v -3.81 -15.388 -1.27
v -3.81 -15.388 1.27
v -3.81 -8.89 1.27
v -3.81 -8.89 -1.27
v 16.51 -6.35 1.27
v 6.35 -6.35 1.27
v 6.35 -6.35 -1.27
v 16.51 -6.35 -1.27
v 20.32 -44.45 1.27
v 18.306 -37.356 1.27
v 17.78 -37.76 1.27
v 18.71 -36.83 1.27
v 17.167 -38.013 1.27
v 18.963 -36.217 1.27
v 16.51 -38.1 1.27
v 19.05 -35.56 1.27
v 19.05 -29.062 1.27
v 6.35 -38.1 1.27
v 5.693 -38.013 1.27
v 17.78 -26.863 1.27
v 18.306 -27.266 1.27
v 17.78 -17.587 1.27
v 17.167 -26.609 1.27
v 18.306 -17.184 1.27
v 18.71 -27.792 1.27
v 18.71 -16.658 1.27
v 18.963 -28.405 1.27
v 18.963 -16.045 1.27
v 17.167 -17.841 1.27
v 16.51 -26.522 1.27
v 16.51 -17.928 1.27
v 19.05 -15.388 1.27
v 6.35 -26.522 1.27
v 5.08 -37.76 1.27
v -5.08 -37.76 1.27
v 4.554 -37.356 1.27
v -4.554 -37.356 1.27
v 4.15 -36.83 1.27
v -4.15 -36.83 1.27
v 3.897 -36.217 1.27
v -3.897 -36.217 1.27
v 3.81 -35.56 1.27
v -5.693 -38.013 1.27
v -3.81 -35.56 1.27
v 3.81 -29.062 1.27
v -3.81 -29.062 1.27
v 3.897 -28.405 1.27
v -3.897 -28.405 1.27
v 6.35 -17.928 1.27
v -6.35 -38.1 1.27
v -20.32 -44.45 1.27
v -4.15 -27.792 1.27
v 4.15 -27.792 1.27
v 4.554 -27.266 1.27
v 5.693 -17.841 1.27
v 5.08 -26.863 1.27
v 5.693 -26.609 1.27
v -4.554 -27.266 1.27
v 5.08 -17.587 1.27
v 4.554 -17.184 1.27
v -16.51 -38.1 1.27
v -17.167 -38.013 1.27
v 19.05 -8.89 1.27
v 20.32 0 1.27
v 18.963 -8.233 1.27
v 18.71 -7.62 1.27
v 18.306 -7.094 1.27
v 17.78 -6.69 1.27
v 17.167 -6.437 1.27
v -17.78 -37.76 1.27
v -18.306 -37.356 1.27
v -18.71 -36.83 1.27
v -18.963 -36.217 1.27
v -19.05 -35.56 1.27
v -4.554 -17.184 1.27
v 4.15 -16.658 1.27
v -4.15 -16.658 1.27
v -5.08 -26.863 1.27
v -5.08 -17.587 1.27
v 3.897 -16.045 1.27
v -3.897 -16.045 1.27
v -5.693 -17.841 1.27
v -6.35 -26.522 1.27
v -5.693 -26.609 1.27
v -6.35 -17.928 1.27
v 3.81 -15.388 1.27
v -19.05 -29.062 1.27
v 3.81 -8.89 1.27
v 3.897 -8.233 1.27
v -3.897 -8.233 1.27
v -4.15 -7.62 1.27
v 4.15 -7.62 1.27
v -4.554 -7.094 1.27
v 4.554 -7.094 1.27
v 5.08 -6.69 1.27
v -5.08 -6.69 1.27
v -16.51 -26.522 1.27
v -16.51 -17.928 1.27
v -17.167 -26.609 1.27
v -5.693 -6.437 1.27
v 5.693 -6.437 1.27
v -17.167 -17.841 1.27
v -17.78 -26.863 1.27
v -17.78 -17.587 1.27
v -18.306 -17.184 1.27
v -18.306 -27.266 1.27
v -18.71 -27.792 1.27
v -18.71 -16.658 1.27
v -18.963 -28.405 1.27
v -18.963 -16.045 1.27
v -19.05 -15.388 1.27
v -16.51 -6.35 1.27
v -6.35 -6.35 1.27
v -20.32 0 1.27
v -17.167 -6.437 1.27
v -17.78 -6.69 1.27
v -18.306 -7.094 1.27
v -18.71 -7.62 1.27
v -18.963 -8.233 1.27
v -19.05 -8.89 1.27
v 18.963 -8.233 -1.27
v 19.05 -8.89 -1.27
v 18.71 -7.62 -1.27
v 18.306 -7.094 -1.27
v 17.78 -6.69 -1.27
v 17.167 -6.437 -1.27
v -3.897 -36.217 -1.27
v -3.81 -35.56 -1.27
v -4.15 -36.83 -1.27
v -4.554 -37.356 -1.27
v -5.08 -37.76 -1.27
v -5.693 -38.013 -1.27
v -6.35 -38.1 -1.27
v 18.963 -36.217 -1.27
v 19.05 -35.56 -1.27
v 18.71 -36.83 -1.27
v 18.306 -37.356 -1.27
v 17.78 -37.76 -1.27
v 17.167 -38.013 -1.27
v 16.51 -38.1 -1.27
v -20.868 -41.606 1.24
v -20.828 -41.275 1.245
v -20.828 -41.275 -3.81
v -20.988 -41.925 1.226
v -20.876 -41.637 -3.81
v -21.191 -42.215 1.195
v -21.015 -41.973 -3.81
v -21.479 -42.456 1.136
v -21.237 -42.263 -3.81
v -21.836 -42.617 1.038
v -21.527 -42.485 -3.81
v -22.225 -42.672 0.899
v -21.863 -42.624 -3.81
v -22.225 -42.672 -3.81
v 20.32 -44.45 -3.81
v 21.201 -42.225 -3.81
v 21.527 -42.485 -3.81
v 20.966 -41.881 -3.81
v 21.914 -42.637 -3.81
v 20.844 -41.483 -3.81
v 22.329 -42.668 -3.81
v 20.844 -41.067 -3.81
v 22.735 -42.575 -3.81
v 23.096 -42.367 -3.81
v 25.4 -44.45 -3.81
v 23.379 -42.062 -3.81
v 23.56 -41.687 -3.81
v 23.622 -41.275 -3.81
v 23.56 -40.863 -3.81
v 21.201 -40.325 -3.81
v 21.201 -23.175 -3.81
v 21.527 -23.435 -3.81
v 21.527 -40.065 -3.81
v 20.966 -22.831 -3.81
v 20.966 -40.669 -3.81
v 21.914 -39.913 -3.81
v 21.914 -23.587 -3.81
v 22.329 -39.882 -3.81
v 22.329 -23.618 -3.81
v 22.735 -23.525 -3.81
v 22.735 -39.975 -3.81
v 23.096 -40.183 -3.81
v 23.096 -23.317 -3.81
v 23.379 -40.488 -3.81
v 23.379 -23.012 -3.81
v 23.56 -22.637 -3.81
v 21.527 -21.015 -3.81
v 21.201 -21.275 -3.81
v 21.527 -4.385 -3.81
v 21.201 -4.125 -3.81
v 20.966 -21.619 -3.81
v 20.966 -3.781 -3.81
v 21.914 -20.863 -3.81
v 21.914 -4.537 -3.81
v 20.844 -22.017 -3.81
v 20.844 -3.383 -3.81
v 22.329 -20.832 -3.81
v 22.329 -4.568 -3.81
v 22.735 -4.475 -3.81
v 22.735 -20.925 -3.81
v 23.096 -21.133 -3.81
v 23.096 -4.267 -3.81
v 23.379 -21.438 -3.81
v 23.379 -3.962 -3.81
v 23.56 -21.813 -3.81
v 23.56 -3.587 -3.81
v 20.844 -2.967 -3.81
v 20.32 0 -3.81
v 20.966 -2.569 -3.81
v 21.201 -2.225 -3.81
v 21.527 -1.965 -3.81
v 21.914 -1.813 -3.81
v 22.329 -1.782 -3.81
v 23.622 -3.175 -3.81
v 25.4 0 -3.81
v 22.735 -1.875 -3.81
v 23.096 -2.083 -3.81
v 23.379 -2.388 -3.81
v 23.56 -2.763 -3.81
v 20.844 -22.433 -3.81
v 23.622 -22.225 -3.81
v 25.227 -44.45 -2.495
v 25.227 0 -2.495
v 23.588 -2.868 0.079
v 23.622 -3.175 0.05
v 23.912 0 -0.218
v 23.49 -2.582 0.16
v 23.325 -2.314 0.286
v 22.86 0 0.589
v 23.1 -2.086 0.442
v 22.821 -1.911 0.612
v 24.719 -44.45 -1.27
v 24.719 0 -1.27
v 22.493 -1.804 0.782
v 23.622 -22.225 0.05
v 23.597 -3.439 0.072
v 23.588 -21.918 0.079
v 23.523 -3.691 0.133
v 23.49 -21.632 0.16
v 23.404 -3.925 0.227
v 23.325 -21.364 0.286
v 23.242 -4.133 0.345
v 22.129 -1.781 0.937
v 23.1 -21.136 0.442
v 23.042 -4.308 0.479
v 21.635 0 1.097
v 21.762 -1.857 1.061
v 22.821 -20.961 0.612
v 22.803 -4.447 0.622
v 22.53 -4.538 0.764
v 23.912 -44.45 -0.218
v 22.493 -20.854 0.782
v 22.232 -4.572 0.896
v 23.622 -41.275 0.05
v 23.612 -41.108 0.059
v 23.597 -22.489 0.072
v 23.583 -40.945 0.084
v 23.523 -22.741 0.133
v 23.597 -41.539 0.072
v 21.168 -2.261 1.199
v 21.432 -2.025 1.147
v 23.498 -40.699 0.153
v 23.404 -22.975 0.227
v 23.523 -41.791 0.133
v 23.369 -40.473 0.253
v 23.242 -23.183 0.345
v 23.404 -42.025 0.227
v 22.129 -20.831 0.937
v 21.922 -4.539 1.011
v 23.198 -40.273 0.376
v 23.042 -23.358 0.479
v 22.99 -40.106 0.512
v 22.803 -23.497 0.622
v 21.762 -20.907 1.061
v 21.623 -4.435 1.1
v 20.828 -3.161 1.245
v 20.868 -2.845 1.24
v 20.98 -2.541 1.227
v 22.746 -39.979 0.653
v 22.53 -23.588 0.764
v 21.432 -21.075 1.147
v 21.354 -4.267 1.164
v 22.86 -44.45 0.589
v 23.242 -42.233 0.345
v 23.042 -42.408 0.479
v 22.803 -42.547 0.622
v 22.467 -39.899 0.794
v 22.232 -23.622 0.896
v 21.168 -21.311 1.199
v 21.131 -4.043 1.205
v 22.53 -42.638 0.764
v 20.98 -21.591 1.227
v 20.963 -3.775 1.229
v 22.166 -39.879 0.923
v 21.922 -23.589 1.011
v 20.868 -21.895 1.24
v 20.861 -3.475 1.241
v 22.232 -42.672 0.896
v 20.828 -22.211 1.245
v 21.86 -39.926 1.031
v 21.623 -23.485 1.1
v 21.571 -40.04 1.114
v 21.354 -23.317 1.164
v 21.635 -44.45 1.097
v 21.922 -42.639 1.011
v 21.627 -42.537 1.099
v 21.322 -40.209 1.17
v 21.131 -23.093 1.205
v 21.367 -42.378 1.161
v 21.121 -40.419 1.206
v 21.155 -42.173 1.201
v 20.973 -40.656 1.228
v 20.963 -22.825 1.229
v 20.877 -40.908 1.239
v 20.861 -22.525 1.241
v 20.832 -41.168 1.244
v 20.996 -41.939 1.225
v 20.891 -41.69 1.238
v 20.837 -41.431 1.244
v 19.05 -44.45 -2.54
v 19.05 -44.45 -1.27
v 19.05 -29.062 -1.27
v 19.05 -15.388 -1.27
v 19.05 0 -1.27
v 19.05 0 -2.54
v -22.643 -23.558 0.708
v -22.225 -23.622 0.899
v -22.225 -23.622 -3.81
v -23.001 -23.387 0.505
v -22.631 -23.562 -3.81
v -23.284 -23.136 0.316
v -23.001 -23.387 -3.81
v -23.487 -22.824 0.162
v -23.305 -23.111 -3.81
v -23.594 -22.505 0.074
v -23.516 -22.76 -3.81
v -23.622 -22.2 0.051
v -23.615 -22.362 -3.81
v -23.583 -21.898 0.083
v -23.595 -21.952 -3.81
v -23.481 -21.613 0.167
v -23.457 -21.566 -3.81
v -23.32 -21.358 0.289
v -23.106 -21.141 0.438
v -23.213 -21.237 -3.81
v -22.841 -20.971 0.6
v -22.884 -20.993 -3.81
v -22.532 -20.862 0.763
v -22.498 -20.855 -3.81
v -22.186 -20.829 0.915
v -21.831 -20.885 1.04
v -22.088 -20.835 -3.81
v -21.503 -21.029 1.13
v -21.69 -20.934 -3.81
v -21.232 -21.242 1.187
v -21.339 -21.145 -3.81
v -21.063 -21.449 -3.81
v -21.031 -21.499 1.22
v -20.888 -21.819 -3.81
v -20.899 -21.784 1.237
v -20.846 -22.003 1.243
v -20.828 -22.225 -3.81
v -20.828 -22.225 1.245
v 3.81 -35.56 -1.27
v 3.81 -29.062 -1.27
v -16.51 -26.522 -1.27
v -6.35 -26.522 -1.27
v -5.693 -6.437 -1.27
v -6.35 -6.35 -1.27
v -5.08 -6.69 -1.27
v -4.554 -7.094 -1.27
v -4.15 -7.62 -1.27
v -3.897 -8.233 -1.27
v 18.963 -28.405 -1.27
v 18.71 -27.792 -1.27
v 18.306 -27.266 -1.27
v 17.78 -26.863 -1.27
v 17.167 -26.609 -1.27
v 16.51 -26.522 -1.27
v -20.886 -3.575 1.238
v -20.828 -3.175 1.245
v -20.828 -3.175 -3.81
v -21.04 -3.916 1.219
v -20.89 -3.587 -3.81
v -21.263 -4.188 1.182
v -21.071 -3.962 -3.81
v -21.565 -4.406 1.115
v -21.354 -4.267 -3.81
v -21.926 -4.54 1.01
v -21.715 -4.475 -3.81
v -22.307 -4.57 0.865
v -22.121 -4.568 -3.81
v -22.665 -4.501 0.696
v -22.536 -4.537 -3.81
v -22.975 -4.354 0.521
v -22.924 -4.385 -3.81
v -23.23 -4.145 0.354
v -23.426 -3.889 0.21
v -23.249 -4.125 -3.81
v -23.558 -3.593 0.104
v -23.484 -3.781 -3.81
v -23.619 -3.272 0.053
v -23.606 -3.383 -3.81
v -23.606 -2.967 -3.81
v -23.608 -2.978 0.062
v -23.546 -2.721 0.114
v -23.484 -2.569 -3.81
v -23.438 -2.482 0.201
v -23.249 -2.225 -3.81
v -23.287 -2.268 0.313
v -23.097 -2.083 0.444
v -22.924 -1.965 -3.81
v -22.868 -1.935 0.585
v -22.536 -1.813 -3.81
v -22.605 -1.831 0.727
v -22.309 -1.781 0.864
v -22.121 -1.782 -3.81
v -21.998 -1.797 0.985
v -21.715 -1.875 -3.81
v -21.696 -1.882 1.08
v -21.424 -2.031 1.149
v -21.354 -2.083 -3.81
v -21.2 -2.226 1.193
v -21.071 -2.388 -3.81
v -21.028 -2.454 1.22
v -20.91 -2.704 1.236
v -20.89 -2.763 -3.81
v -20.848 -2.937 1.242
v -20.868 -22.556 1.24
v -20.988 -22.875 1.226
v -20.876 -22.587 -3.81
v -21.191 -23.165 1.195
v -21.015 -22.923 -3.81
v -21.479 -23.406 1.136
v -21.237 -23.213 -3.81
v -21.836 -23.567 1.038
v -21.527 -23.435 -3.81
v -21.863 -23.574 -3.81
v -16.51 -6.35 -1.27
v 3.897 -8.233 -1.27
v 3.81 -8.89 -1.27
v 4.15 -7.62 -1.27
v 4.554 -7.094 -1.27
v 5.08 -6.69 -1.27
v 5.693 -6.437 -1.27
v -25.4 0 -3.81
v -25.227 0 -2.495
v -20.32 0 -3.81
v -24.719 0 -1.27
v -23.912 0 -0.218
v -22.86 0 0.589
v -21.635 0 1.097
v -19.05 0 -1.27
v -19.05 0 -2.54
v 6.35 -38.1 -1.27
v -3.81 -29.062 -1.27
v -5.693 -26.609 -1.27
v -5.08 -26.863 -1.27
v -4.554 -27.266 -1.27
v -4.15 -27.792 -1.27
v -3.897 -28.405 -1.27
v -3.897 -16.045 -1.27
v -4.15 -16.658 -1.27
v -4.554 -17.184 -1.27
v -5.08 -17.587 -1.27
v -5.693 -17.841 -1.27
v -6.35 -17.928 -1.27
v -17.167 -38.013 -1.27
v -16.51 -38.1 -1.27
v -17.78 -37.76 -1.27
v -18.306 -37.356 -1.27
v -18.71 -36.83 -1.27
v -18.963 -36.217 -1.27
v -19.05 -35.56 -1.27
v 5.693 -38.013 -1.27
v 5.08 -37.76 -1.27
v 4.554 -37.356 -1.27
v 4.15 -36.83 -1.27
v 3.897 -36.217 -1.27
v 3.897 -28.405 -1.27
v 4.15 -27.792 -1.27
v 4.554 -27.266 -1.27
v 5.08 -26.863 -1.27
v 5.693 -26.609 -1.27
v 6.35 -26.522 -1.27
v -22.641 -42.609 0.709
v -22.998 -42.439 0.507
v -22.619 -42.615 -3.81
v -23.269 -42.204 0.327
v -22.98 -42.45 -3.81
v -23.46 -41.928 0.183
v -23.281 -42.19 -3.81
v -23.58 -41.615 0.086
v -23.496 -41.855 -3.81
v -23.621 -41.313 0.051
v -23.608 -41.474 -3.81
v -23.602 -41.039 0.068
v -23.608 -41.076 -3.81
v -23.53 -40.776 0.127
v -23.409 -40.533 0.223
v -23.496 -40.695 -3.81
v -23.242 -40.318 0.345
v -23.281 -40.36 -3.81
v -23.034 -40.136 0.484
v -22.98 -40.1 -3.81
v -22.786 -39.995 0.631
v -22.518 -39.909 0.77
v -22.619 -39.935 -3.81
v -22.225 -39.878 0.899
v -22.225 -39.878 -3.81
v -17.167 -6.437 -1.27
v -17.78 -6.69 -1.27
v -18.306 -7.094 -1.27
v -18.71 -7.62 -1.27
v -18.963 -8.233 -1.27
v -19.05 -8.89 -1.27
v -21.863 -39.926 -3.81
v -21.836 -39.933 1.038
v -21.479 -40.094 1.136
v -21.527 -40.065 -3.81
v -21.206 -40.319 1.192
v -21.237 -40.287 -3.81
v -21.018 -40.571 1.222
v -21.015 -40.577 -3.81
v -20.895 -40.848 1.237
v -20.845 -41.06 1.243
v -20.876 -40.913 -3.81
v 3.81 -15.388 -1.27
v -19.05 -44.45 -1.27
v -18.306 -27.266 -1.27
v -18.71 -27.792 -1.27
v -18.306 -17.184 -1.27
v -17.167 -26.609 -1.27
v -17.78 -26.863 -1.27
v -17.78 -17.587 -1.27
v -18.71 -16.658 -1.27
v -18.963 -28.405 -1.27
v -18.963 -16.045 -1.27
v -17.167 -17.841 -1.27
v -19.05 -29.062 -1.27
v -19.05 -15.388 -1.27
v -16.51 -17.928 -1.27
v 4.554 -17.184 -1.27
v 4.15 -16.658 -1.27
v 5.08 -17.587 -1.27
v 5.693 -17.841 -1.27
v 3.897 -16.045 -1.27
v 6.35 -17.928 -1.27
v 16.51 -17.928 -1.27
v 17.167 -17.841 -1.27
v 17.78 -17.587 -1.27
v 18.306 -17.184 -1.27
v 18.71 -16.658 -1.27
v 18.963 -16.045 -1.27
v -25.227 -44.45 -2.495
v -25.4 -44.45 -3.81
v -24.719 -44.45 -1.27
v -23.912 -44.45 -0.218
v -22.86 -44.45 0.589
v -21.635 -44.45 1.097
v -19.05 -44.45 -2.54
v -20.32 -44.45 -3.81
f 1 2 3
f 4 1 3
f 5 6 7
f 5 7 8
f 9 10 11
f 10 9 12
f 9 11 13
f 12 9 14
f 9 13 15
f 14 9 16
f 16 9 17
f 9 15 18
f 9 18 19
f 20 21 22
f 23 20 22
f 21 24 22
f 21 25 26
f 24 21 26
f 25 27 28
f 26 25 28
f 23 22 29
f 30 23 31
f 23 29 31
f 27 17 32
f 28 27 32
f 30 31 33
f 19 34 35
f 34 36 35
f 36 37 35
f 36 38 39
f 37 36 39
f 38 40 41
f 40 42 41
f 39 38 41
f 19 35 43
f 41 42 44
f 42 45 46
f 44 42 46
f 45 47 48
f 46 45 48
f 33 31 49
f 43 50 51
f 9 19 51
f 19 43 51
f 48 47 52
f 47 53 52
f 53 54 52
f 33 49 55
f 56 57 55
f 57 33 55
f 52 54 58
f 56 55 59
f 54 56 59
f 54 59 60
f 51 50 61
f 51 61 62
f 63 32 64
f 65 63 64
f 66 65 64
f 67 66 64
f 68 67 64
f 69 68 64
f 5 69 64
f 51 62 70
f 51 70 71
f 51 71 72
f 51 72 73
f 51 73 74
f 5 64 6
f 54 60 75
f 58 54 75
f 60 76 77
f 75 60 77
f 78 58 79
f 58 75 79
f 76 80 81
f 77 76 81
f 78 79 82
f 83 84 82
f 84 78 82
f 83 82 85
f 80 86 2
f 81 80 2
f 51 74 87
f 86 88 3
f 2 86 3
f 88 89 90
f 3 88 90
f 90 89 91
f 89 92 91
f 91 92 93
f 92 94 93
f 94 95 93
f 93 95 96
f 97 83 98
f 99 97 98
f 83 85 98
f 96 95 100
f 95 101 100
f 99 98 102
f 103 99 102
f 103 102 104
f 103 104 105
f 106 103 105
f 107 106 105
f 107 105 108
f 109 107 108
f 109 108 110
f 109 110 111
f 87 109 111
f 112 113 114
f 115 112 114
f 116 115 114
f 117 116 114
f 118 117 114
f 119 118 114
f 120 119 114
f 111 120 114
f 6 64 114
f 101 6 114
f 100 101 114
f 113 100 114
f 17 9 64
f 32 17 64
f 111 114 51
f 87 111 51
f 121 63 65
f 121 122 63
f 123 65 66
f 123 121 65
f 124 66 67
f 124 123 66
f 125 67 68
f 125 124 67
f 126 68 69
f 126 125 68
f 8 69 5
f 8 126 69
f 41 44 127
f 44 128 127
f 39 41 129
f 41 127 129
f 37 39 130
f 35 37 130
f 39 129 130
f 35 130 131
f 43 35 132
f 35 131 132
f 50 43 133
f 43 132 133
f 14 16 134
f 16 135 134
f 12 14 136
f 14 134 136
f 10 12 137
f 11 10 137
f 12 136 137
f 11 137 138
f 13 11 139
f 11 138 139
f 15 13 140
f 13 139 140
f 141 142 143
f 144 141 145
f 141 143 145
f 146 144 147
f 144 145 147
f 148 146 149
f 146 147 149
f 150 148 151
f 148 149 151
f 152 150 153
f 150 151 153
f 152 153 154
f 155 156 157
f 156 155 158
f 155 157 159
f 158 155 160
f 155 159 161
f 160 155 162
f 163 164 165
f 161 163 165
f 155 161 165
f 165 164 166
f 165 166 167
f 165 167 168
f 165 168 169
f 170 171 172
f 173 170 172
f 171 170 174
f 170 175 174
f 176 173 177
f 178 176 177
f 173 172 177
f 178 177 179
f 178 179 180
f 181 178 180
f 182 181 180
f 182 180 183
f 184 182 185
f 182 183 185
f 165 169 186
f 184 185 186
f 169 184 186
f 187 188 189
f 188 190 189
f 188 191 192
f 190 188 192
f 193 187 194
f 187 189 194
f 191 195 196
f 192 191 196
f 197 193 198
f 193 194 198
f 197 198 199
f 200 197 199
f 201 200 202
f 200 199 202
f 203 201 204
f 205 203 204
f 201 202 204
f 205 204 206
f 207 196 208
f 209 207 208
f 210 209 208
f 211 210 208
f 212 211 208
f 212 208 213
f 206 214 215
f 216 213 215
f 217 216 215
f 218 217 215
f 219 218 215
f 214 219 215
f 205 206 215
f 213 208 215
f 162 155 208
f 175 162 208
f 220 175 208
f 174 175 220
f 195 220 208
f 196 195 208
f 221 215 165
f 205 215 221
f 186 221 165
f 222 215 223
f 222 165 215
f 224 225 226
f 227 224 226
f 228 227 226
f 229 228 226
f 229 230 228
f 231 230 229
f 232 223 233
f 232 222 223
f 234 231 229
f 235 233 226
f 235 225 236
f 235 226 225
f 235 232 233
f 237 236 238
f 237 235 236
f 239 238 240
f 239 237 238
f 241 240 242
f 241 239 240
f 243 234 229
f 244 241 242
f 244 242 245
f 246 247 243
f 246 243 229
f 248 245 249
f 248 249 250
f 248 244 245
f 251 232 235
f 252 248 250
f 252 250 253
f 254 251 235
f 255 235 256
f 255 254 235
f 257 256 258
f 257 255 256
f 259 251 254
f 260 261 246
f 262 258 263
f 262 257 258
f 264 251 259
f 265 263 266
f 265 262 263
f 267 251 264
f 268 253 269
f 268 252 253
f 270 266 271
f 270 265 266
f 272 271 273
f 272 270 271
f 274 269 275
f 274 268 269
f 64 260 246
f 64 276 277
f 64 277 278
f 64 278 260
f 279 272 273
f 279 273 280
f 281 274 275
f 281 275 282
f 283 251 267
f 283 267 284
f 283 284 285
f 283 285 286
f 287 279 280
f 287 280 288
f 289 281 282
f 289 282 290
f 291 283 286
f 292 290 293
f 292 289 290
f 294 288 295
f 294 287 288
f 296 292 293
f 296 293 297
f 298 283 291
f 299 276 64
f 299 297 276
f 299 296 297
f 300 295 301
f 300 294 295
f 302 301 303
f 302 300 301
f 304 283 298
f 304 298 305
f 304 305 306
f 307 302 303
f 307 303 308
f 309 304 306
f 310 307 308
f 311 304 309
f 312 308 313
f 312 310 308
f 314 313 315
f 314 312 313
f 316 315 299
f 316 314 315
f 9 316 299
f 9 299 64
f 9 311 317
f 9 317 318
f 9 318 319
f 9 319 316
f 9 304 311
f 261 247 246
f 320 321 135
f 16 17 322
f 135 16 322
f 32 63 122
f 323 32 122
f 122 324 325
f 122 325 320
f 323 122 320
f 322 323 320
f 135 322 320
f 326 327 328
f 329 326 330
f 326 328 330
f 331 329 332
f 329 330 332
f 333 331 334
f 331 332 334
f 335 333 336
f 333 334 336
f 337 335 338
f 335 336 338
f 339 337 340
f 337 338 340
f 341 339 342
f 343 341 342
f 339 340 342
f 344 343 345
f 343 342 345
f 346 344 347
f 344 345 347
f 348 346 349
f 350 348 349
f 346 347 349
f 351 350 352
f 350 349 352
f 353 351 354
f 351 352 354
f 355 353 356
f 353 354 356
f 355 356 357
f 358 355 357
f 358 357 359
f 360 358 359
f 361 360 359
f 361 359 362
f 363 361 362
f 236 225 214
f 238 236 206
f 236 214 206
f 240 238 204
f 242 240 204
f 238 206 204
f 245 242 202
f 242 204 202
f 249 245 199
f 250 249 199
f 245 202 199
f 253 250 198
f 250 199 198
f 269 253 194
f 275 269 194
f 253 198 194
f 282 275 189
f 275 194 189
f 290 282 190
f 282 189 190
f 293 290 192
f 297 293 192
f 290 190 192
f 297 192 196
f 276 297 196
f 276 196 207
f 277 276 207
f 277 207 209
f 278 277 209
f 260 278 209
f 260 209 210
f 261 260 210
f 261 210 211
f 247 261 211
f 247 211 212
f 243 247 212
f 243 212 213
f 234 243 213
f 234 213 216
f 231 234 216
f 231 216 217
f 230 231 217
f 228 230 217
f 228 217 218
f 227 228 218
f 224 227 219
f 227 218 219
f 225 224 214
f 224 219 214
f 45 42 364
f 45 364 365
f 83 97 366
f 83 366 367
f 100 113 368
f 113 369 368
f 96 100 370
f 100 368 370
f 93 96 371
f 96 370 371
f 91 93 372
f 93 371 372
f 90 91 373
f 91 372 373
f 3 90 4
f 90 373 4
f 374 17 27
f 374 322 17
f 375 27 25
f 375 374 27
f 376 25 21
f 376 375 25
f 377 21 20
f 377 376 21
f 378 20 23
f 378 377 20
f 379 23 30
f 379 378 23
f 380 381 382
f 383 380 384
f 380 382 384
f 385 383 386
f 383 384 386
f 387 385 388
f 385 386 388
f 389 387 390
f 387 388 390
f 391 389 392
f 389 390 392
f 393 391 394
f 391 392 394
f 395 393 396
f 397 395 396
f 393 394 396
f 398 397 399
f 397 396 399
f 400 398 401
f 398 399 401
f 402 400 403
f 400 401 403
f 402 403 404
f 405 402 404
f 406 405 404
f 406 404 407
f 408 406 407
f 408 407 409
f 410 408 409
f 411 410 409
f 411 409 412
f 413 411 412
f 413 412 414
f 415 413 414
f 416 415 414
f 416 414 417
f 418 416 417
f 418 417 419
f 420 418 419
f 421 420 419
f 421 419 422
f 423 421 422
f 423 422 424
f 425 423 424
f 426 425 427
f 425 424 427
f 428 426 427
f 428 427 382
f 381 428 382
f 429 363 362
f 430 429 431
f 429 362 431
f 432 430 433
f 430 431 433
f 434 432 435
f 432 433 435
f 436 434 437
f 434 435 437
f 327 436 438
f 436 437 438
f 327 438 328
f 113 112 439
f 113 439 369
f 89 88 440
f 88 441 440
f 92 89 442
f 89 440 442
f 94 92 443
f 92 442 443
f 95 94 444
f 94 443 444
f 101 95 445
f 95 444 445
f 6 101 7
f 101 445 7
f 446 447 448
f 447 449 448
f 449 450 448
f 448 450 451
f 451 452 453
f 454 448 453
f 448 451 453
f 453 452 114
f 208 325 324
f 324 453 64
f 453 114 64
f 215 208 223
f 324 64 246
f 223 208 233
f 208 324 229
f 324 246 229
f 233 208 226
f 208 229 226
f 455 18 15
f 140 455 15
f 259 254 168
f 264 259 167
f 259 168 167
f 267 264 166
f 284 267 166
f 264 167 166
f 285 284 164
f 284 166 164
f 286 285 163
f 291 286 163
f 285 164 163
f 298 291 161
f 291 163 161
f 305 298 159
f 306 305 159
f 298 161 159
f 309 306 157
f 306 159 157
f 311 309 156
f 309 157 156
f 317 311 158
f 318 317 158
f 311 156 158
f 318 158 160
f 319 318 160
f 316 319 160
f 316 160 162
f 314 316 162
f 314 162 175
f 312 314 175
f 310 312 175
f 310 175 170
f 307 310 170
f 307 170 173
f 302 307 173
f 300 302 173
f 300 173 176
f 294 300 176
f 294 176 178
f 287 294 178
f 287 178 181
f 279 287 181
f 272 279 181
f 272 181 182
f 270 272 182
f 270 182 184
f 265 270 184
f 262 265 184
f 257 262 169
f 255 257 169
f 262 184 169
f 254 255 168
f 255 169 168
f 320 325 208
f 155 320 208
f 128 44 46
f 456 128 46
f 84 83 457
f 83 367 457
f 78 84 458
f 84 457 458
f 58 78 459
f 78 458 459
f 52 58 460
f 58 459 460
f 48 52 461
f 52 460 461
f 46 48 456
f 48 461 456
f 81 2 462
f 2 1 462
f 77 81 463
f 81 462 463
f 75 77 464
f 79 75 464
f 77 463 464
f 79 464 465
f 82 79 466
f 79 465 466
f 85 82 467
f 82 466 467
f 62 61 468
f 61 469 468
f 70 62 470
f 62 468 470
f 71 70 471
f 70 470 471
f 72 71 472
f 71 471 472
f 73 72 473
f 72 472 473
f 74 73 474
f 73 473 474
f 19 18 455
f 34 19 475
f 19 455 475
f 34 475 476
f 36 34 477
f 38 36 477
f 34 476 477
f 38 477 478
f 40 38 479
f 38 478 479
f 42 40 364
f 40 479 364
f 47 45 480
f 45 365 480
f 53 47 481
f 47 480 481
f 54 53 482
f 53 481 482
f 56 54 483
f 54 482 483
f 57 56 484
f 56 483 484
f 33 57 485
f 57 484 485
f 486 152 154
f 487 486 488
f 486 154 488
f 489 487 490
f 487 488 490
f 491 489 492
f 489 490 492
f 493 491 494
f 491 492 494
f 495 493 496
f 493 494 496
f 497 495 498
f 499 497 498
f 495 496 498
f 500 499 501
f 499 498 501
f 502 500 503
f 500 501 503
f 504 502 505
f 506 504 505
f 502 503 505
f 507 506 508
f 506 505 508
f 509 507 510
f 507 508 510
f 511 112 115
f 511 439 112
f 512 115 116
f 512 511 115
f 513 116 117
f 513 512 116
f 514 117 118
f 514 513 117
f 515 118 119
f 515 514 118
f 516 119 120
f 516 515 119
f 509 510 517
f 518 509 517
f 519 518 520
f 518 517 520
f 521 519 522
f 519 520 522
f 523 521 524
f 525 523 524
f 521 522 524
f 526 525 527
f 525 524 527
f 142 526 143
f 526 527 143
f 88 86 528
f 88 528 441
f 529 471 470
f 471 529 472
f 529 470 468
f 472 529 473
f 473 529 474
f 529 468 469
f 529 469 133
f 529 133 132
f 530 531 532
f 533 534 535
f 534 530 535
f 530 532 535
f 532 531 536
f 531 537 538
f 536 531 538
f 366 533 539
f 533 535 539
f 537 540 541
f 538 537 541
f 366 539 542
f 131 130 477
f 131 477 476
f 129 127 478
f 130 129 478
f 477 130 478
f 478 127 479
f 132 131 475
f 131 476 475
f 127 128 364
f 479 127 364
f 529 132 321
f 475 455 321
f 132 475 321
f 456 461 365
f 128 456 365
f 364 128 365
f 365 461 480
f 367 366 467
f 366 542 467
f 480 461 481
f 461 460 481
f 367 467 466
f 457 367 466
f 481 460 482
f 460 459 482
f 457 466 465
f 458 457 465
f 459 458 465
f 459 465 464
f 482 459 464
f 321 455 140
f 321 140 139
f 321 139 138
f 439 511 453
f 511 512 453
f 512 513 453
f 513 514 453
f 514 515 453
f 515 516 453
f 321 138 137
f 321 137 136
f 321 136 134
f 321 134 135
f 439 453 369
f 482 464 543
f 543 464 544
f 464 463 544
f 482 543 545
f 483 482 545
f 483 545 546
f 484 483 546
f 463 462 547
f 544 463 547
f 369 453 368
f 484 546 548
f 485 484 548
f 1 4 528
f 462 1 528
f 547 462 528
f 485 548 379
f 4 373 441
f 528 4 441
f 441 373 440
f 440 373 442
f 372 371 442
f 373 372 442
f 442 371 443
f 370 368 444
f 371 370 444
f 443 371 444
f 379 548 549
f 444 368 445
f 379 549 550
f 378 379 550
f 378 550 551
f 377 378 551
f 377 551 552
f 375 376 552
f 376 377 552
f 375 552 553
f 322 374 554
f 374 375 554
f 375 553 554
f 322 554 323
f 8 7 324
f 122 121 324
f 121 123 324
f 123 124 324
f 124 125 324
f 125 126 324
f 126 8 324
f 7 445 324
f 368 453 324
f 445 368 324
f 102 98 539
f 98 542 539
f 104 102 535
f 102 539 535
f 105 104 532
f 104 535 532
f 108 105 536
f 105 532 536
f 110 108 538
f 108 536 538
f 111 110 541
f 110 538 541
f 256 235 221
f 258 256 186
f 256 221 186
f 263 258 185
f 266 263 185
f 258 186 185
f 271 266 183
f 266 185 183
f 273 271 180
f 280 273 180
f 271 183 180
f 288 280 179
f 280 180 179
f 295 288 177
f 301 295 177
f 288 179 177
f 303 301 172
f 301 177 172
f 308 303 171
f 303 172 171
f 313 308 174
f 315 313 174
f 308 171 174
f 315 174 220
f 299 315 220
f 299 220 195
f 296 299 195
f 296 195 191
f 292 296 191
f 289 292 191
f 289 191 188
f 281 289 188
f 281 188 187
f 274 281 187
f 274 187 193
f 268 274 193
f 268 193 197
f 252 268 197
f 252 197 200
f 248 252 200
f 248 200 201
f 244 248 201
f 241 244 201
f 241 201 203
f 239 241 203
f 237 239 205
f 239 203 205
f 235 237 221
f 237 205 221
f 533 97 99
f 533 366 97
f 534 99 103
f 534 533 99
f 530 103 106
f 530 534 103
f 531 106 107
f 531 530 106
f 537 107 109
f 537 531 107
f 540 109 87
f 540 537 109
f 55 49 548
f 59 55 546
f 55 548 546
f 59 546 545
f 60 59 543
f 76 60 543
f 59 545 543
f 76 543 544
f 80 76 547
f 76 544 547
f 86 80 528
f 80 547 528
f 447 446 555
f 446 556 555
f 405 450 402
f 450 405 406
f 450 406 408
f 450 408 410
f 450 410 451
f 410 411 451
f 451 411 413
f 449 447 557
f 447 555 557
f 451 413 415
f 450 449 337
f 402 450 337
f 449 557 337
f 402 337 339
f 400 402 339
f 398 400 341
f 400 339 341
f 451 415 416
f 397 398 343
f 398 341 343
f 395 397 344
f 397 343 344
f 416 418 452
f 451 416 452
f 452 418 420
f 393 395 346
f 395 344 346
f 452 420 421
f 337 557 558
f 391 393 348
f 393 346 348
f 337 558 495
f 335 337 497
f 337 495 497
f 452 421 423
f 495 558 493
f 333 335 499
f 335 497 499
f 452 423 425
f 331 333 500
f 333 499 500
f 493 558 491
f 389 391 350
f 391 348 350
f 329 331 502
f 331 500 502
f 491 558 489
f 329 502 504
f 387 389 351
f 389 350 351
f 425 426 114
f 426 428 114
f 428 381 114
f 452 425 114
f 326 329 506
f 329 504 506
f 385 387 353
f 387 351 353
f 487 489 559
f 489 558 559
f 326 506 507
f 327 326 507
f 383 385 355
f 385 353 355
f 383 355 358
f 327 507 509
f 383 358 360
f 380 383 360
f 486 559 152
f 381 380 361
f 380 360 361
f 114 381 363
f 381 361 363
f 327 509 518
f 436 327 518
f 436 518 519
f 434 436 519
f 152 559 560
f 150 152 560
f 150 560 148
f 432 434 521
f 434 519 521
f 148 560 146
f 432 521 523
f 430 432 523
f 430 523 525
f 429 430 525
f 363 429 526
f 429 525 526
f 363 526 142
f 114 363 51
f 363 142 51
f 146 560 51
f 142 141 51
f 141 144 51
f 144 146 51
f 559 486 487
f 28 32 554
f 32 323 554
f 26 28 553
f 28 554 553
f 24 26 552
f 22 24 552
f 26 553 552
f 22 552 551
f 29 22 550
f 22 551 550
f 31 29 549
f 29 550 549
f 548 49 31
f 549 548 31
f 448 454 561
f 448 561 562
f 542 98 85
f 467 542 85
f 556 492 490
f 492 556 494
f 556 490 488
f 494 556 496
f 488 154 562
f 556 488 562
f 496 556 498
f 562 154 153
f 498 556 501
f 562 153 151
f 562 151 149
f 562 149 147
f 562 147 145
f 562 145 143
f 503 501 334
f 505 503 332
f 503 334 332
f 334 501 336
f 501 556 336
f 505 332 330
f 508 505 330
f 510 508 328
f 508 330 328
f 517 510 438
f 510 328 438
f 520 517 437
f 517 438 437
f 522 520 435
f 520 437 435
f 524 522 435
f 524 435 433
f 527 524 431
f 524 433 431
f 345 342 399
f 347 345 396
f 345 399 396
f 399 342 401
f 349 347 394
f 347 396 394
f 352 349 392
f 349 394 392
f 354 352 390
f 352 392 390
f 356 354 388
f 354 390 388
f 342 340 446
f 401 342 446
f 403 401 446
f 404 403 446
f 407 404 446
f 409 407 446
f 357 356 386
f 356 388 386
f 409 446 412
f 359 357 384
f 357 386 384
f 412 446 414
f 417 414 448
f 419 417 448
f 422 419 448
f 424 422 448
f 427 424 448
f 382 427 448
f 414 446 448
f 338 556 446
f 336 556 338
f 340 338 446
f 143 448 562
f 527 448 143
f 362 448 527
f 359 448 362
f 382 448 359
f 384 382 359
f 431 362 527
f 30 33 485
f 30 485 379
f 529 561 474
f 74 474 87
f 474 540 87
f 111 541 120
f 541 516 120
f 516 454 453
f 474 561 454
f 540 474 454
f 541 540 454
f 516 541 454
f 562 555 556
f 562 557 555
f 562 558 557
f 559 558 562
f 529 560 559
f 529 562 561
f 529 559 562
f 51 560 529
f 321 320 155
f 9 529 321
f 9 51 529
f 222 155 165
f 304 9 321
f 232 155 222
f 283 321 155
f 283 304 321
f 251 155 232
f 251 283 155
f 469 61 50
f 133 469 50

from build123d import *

# Parameters (mm, degrees)
F1_DEPTH    = 44.45
F2_R        = 5.07999
F3_R        = 1.397
F4_DEPTH    = 25.4
F5_W        = 15.24
F5_H        = 11.5777312835
F6_DEPTH    = 25.4
F7_R        = 2.54
F8_T1_DEPTH = 50.9820747894


# Not quite as in the source:
# - a fillet or chamfer that OpenCascade refuses, or shapes differently, is made with other operations: its cross-section is extruded or revolved along the edge and cut away or added
# - a fillet or chamfer is up to 0.001 mm smaller than in the source, because OpenCascade refuses the exact size


with BuildPart() as f1:
    # F0 (on Front) → F1 (new body)
    with BuildSketch(Plane.XZ):
        Polygon((0, 1.27), (-25.4, 1.27), (-25.4, -1.27), (-25.4, -3.81), (-19.05, -3.81), (-19.05, -1.27), (19.05, -1.27), (19.05, -3.81), (25.4, -3.81), (25.4, -1.27), (25.4, 1.27), align=None)
    extrude(amount=F1_DEPTH)

    # F2 (radius 5.08 in the source; OpenCascade refuses exactly that, so slightly less here)
    f2_edges = [f1.edges().sort_by_distance(p)[0] for p in [
        (-25.4, -22.225, 1.27),
        (25.4, -22.225, 1.27),
    ]]
    fillet(f2_edges, radius=F2_R)

    # F3 (on face) → F4 (cut)
    with BuildSketch(Plane(origin=(0, 0, -3.81), x_dir=(1, 0, 0), z_dir=(0, 0, -1))):
        with BuildLine():
            ThreePointArc((-22.225, 23.622), (-23.2128281733, 21.2371718267), (-20.828, 22.225))
            Line((-20.828, 22.225), (-22.225, 22.225))
            Line((-22.225, 22.225), (-22.225, 23.622))
        make_face()
        with BuildLine():
            Line((-22.225, 22.225), (-20.828, 22.225))
            ThreePointArc((-20.828, 22.225), (-21.2371718267, 23.2128281733), (-22.225, 23.622))
            Line((-22.225, 23.622), (-22.225, 22.225))
        make_face()
        with BuildLine():
            ThreePointArc((-22.225, 42.672), (-23.622, 41.275), (-22.225, 39.878))
            Line((-22.225, 39.878), (-22.225, 41.275))
            Line((-22.225, 41.275), (-22.225, 42.672))
        make_face()
        with BuildLine():
            Line((-22.225, 41.275), (-22.225, 39.878))
            ThreePointArc((-22.225, 39.878), (-21.2371718267, 40.2871718267), (-20.828, 41.275))
            ThreePointArc((-20.828, 41.275), (-21.2371718267, 42.2628281733), (-22.225, 42.672))
            Line((-22.225, 42.672), (-22.225, 41.275))
        make_face()
        with Locations((-22.225, 3.175)):
            Circle(F3_R)
        with Locations((22.225, 41.275)):
            Circle(F3_R)
        with Locations((22.225, 3.175)):
            Circle(F3_R)
        with Locations((22.225, 22.225)):
            Circle(F3_R)
    extrude(amount=-F4_DEPTH, mode=Mode.SUBTRACT)

    # F5 (on face) → F6 (cut)
    with BuildSketch(Plane.XY.offset(1.27)):
        with Locations((11.43, -12.1388656418)):
            Rectangle(F5_W, F5_H)
        with Locations((-11.43, -12.1388656418)):
            Rectangle(F5_W, F5_H)
        with Locations((11.43, -32.3111343582)):
            Rectangle(F5_W, F5_H)
        with Locations((-11.43, -32.3111343582)):
            Rectangle(F5_W, F5_H)
    extrude(amount=-F6_DEPTH, mode=Mode.SUBTRACT)

    # F7
    f7_edges = [f1.edges().sort_by_distance(p)[0] for p in [
        (-19.05, -6.35, 0),
        (-3.81, -17.927731, 0),
        (-3.81, -6.35, 0),
        (-19.05, -17.927731, 0),
        (-19.05, -38.1, 0),
        (3.81, -38.1, 0),
        (3.81, -17.927731, 0),
        (3.81, -6.35, 0),
        (-19.05, -26.522269, 0),
        (3.81, -26.522269, 0),
        (19.05, -26.522269, 0),
        (-3.81, -26.522269, 0),
        (19.05, -6.35, 0),
        (19.05, -17.927731, 0),
        (19.05, -38.1, 0),
        (-3.81, -38.1, 0),
    ]]
    fillet(f7_edges, radius=F7_R)

    # F8: chamfer of 1.27 on 14 edges, made by hand

    # F8_s2 → F8_t1 (cut)
    with BuildSketch(Plane.XZ.offset(-3.2660373947)):
        Polygon((19.05, -2.54), (20.32, -3.81), (19.05, -3.81), align=None)
        Polygon((-19.05, -2.54), (-20.32, -3.81), (-19.05, -3.81), align=None)
    extrude(amount=F8_T1_DEPTH, mode=Mode.SUBTRACT)


solid = f1.part
